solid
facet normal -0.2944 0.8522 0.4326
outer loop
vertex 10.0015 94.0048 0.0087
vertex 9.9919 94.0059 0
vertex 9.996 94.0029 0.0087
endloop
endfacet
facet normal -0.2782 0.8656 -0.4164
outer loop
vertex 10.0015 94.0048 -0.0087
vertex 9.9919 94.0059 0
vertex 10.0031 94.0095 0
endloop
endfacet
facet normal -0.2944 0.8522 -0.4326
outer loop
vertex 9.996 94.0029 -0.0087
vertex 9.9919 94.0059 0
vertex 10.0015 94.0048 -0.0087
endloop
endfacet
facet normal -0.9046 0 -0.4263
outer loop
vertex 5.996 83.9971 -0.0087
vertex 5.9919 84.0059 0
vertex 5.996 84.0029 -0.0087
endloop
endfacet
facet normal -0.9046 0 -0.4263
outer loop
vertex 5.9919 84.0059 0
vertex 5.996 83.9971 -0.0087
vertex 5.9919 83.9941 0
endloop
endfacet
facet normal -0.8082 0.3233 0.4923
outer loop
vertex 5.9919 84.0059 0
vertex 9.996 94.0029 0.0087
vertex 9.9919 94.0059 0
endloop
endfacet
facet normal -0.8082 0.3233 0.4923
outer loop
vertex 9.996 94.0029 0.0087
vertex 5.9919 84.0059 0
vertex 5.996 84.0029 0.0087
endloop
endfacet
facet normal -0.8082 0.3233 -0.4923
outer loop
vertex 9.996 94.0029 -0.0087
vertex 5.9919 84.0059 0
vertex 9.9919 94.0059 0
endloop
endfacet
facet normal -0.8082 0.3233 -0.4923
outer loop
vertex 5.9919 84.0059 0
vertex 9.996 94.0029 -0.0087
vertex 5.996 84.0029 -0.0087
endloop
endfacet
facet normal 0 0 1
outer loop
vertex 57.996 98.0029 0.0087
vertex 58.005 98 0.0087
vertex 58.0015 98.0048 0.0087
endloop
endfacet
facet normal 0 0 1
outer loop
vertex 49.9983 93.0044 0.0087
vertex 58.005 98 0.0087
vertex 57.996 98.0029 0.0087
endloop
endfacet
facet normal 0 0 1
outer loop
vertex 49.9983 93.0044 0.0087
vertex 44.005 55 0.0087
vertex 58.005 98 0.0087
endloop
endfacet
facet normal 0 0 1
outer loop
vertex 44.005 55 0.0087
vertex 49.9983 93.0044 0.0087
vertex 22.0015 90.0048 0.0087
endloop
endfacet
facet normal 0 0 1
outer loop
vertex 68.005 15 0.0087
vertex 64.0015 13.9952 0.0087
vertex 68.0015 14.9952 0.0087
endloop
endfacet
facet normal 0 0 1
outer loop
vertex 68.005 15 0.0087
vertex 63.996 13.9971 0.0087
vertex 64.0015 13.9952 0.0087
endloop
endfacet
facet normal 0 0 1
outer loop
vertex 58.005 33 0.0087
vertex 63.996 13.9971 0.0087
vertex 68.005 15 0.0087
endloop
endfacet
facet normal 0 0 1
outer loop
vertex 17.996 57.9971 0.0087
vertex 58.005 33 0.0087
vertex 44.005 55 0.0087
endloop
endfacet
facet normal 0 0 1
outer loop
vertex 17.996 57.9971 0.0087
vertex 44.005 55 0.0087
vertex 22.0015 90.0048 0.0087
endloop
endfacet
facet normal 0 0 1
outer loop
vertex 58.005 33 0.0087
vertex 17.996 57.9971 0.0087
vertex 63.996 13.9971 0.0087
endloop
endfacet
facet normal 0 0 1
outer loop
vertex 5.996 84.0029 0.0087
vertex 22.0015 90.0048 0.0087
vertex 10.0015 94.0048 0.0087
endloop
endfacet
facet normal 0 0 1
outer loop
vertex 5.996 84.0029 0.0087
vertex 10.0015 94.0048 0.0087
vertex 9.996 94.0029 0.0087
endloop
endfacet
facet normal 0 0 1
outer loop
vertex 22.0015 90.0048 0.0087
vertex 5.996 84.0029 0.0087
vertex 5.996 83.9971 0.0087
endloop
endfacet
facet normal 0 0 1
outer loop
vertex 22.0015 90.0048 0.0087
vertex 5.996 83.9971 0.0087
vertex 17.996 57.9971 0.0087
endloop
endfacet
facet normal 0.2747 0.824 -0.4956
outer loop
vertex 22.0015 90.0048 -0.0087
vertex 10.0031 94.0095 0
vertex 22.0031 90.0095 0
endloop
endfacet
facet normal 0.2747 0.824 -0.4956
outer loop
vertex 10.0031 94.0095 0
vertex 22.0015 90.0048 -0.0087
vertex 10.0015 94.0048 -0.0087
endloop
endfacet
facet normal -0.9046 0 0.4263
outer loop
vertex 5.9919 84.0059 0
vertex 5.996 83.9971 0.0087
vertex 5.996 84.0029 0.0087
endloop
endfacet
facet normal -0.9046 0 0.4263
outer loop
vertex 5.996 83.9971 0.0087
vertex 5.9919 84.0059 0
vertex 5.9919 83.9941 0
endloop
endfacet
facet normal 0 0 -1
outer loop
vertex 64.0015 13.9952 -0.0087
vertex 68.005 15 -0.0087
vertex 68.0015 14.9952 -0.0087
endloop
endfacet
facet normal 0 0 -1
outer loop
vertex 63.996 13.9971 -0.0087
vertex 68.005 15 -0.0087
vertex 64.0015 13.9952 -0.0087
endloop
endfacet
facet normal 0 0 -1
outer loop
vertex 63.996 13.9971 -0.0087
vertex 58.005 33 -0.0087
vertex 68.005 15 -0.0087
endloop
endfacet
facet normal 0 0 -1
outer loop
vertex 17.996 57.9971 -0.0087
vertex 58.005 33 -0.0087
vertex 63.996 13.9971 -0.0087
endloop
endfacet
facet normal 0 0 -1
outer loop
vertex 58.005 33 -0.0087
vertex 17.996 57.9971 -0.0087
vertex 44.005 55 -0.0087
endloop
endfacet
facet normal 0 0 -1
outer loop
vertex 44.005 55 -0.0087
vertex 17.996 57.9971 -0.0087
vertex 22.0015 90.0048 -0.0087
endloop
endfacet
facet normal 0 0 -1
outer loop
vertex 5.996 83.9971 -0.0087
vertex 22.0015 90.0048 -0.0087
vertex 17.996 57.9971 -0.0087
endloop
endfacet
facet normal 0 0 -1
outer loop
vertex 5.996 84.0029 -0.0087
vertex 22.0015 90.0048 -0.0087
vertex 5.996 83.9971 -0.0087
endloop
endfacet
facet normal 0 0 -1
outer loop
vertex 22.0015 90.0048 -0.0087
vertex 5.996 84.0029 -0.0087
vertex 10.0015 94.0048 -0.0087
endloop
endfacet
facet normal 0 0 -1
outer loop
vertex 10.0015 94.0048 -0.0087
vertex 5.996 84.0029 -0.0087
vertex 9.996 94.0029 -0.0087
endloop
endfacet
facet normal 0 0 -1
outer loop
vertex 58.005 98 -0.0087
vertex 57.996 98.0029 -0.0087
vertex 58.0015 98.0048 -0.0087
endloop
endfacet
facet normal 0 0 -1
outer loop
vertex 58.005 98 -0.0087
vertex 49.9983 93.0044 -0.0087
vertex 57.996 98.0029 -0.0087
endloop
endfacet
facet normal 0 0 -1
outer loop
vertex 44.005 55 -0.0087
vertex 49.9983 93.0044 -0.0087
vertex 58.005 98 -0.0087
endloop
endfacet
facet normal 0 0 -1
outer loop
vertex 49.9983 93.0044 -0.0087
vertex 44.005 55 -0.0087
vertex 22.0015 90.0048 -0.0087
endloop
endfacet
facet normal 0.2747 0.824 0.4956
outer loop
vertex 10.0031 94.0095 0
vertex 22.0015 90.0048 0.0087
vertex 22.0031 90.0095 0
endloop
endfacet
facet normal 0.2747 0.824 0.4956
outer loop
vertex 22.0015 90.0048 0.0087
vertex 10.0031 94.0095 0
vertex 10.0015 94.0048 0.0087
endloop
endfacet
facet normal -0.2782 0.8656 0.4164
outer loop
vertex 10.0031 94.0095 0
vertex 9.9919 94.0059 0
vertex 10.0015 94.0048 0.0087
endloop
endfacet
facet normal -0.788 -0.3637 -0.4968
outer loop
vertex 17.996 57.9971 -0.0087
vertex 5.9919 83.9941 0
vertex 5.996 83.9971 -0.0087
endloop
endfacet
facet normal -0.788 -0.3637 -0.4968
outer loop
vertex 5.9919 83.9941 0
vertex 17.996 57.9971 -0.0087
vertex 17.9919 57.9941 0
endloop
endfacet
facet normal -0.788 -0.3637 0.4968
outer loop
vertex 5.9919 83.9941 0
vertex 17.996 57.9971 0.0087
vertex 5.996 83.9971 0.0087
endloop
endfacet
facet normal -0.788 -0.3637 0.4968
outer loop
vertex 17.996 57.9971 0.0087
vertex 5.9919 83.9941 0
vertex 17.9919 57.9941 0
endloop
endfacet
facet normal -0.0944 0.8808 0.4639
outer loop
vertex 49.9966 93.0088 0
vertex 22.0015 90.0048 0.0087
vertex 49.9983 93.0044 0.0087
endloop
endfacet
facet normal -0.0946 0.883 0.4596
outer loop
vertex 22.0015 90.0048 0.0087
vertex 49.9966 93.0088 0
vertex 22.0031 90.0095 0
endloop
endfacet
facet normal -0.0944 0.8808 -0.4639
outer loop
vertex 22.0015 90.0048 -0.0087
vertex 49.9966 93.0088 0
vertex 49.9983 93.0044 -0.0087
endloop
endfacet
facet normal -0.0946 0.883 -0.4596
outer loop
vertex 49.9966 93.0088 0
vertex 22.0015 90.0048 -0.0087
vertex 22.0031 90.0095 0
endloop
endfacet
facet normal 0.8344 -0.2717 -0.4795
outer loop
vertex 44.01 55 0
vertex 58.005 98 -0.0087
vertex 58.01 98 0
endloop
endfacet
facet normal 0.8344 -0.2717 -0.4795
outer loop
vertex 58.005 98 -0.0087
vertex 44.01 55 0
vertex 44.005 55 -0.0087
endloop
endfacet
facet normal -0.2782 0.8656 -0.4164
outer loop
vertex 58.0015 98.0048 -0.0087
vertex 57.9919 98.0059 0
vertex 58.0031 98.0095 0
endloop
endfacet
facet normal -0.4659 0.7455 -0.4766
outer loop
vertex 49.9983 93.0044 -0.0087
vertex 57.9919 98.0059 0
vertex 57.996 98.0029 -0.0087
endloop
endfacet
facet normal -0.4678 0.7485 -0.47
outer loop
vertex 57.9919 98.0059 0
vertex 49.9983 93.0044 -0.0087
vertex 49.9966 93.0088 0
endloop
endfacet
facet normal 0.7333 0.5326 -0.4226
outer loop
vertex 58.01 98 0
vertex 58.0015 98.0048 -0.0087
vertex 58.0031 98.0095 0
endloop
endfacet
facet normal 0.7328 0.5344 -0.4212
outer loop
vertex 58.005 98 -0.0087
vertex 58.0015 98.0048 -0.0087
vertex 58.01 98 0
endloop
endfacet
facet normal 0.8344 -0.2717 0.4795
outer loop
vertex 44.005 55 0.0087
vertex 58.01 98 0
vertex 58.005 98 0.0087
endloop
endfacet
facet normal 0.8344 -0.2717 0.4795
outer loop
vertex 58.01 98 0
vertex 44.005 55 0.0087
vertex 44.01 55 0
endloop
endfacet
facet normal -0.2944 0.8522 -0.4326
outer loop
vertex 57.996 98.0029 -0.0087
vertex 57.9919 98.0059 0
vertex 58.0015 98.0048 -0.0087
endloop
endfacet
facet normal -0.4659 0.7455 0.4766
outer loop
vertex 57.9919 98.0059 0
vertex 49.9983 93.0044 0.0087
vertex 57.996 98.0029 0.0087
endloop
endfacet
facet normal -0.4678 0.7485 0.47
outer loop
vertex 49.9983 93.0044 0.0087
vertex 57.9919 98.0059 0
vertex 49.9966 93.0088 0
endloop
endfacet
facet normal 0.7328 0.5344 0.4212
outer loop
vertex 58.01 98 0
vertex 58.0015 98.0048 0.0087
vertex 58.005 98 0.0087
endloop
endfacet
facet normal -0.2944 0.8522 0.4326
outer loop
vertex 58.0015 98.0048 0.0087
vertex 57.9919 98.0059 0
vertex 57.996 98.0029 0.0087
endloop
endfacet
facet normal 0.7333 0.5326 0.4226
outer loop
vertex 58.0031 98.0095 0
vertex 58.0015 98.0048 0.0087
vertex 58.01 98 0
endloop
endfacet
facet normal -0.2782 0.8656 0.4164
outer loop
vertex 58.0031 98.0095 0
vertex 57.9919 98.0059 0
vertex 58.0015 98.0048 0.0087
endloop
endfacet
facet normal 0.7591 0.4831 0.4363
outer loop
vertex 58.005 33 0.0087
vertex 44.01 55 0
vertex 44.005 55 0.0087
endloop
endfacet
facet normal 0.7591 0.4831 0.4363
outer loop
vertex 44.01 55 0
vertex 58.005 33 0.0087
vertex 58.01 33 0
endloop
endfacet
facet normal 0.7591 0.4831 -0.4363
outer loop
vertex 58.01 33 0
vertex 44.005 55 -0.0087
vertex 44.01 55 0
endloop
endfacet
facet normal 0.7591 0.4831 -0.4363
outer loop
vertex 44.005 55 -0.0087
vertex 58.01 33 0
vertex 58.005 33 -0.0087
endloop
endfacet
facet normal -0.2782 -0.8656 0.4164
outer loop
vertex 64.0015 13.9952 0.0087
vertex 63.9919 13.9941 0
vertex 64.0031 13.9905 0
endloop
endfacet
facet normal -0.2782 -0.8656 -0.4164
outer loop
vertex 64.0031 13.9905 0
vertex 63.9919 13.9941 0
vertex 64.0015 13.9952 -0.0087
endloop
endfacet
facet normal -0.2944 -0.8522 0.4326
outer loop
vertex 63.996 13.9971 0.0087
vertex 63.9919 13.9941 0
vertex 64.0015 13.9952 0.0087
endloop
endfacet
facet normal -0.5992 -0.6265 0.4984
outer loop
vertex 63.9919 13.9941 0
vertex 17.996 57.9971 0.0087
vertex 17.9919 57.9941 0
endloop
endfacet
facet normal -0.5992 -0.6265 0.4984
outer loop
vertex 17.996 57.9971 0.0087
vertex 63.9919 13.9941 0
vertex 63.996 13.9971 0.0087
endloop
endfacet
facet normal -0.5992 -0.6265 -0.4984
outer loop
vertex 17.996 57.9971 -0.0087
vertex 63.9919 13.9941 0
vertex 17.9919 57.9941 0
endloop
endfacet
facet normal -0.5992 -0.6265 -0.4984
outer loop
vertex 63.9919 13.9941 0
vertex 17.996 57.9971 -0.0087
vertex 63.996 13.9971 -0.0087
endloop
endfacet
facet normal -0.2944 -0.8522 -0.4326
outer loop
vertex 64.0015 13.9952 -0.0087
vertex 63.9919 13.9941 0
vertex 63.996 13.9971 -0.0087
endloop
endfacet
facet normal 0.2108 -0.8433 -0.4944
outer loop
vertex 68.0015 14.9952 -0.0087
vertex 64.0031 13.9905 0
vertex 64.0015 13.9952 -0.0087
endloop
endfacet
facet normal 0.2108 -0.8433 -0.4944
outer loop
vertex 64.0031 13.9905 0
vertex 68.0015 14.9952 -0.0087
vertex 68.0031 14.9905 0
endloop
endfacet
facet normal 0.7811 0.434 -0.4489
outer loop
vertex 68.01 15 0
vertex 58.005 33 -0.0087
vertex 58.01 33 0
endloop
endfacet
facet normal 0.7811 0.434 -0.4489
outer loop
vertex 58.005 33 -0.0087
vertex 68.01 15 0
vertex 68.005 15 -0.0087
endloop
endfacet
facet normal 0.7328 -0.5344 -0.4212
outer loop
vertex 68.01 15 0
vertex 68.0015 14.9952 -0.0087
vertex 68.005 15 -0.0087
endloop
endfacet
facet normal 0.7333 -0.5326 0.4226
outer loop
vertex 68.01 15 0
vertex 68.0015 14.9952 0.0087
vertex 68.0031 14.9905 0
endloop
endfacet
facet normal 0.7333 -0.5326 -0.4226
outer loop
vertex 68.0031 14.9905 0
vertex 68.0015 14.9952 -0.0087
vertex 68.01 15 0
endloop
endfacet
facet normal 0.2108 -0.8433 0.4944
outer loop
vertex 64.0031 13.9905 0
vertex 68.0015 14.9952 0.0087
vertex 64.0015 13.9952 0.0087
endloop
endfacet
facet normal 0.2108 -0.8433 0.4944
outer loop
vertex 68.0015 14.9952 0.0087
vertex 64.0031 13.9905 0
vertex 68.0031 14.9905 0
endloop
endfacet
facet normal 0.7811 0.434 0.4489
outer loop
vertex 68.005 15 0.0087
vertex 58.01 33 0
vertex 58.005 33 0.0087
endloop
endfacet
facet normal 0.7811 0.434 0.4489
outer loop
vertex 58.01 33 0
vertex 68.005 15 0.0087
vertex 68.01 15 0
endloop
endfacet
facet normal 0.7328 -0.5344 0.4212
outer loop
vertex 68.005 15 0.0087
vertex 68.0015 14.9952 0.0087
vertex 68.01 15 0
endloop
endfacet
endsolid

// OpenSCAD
color([0.05142027398452964,0.9735218258566558,0.047591888593015]) hull(){
    translate([22,90]) sphere(0.01);
    translate([10,94]) sphere(0.01);
    translate([6,84]) sphere(0.01);
}
color([0.8117500261145564,0.1615065561540321,0.3411082674078115]) hull(){
    translate([18,58]) sphere(0.01);
    translate([22,90]) sphere(0.01);
    translate([6,84]) sphere(0.01);
}
color([0.14556283410772275,0.1669050296719239,0.2126506408007548]) hull(){
    translate([44,55]) sphere(0.01);
    translate([22,90]) sphere(0.01);
    translate([18,58]) sphere(0.01);
}
color([0.1643781309953597,0.1969053124243212,0.8923696098751848]) hull(){
    translate([44,55]) sphere(0.01);
    translate([50,93]) sphere(0.01);
    translate([22,90]) sphere(0.01);
}
color([0.6524445092977721,0.27717367144232374,0.36665226255557337]) hull(){
    translate([44,55]) sphere(0.01);
    translate([58,98]) sphere(0.01);
    translate([50,93]) sphere(0.01);
}
color([0.28280230463247347,0.3982188312652467,0.8731076904851287]) hull(){
    translate([58,33]) sphere(0.01);
    translate([44,55]) sphere(0.01);
    translate([18,58]) sphere(0.01);
}
color([0.951068245159231,0.9645876729249203,0.1649882215820635]) hull(){
    translate([64,14]) sphere(0.01);
    translate([58,33]) sphere(0.01);
    translate([18,58]) sphere(0.01);
}
color([0.85781092577519,0.30052632891855435,0.16180594642971435]) hull(){
    translate([58,33]) sphere(0.01);
    translate([64,14]) sphere(0.01);
    translate([68,15]) sphere(0.01);
}
